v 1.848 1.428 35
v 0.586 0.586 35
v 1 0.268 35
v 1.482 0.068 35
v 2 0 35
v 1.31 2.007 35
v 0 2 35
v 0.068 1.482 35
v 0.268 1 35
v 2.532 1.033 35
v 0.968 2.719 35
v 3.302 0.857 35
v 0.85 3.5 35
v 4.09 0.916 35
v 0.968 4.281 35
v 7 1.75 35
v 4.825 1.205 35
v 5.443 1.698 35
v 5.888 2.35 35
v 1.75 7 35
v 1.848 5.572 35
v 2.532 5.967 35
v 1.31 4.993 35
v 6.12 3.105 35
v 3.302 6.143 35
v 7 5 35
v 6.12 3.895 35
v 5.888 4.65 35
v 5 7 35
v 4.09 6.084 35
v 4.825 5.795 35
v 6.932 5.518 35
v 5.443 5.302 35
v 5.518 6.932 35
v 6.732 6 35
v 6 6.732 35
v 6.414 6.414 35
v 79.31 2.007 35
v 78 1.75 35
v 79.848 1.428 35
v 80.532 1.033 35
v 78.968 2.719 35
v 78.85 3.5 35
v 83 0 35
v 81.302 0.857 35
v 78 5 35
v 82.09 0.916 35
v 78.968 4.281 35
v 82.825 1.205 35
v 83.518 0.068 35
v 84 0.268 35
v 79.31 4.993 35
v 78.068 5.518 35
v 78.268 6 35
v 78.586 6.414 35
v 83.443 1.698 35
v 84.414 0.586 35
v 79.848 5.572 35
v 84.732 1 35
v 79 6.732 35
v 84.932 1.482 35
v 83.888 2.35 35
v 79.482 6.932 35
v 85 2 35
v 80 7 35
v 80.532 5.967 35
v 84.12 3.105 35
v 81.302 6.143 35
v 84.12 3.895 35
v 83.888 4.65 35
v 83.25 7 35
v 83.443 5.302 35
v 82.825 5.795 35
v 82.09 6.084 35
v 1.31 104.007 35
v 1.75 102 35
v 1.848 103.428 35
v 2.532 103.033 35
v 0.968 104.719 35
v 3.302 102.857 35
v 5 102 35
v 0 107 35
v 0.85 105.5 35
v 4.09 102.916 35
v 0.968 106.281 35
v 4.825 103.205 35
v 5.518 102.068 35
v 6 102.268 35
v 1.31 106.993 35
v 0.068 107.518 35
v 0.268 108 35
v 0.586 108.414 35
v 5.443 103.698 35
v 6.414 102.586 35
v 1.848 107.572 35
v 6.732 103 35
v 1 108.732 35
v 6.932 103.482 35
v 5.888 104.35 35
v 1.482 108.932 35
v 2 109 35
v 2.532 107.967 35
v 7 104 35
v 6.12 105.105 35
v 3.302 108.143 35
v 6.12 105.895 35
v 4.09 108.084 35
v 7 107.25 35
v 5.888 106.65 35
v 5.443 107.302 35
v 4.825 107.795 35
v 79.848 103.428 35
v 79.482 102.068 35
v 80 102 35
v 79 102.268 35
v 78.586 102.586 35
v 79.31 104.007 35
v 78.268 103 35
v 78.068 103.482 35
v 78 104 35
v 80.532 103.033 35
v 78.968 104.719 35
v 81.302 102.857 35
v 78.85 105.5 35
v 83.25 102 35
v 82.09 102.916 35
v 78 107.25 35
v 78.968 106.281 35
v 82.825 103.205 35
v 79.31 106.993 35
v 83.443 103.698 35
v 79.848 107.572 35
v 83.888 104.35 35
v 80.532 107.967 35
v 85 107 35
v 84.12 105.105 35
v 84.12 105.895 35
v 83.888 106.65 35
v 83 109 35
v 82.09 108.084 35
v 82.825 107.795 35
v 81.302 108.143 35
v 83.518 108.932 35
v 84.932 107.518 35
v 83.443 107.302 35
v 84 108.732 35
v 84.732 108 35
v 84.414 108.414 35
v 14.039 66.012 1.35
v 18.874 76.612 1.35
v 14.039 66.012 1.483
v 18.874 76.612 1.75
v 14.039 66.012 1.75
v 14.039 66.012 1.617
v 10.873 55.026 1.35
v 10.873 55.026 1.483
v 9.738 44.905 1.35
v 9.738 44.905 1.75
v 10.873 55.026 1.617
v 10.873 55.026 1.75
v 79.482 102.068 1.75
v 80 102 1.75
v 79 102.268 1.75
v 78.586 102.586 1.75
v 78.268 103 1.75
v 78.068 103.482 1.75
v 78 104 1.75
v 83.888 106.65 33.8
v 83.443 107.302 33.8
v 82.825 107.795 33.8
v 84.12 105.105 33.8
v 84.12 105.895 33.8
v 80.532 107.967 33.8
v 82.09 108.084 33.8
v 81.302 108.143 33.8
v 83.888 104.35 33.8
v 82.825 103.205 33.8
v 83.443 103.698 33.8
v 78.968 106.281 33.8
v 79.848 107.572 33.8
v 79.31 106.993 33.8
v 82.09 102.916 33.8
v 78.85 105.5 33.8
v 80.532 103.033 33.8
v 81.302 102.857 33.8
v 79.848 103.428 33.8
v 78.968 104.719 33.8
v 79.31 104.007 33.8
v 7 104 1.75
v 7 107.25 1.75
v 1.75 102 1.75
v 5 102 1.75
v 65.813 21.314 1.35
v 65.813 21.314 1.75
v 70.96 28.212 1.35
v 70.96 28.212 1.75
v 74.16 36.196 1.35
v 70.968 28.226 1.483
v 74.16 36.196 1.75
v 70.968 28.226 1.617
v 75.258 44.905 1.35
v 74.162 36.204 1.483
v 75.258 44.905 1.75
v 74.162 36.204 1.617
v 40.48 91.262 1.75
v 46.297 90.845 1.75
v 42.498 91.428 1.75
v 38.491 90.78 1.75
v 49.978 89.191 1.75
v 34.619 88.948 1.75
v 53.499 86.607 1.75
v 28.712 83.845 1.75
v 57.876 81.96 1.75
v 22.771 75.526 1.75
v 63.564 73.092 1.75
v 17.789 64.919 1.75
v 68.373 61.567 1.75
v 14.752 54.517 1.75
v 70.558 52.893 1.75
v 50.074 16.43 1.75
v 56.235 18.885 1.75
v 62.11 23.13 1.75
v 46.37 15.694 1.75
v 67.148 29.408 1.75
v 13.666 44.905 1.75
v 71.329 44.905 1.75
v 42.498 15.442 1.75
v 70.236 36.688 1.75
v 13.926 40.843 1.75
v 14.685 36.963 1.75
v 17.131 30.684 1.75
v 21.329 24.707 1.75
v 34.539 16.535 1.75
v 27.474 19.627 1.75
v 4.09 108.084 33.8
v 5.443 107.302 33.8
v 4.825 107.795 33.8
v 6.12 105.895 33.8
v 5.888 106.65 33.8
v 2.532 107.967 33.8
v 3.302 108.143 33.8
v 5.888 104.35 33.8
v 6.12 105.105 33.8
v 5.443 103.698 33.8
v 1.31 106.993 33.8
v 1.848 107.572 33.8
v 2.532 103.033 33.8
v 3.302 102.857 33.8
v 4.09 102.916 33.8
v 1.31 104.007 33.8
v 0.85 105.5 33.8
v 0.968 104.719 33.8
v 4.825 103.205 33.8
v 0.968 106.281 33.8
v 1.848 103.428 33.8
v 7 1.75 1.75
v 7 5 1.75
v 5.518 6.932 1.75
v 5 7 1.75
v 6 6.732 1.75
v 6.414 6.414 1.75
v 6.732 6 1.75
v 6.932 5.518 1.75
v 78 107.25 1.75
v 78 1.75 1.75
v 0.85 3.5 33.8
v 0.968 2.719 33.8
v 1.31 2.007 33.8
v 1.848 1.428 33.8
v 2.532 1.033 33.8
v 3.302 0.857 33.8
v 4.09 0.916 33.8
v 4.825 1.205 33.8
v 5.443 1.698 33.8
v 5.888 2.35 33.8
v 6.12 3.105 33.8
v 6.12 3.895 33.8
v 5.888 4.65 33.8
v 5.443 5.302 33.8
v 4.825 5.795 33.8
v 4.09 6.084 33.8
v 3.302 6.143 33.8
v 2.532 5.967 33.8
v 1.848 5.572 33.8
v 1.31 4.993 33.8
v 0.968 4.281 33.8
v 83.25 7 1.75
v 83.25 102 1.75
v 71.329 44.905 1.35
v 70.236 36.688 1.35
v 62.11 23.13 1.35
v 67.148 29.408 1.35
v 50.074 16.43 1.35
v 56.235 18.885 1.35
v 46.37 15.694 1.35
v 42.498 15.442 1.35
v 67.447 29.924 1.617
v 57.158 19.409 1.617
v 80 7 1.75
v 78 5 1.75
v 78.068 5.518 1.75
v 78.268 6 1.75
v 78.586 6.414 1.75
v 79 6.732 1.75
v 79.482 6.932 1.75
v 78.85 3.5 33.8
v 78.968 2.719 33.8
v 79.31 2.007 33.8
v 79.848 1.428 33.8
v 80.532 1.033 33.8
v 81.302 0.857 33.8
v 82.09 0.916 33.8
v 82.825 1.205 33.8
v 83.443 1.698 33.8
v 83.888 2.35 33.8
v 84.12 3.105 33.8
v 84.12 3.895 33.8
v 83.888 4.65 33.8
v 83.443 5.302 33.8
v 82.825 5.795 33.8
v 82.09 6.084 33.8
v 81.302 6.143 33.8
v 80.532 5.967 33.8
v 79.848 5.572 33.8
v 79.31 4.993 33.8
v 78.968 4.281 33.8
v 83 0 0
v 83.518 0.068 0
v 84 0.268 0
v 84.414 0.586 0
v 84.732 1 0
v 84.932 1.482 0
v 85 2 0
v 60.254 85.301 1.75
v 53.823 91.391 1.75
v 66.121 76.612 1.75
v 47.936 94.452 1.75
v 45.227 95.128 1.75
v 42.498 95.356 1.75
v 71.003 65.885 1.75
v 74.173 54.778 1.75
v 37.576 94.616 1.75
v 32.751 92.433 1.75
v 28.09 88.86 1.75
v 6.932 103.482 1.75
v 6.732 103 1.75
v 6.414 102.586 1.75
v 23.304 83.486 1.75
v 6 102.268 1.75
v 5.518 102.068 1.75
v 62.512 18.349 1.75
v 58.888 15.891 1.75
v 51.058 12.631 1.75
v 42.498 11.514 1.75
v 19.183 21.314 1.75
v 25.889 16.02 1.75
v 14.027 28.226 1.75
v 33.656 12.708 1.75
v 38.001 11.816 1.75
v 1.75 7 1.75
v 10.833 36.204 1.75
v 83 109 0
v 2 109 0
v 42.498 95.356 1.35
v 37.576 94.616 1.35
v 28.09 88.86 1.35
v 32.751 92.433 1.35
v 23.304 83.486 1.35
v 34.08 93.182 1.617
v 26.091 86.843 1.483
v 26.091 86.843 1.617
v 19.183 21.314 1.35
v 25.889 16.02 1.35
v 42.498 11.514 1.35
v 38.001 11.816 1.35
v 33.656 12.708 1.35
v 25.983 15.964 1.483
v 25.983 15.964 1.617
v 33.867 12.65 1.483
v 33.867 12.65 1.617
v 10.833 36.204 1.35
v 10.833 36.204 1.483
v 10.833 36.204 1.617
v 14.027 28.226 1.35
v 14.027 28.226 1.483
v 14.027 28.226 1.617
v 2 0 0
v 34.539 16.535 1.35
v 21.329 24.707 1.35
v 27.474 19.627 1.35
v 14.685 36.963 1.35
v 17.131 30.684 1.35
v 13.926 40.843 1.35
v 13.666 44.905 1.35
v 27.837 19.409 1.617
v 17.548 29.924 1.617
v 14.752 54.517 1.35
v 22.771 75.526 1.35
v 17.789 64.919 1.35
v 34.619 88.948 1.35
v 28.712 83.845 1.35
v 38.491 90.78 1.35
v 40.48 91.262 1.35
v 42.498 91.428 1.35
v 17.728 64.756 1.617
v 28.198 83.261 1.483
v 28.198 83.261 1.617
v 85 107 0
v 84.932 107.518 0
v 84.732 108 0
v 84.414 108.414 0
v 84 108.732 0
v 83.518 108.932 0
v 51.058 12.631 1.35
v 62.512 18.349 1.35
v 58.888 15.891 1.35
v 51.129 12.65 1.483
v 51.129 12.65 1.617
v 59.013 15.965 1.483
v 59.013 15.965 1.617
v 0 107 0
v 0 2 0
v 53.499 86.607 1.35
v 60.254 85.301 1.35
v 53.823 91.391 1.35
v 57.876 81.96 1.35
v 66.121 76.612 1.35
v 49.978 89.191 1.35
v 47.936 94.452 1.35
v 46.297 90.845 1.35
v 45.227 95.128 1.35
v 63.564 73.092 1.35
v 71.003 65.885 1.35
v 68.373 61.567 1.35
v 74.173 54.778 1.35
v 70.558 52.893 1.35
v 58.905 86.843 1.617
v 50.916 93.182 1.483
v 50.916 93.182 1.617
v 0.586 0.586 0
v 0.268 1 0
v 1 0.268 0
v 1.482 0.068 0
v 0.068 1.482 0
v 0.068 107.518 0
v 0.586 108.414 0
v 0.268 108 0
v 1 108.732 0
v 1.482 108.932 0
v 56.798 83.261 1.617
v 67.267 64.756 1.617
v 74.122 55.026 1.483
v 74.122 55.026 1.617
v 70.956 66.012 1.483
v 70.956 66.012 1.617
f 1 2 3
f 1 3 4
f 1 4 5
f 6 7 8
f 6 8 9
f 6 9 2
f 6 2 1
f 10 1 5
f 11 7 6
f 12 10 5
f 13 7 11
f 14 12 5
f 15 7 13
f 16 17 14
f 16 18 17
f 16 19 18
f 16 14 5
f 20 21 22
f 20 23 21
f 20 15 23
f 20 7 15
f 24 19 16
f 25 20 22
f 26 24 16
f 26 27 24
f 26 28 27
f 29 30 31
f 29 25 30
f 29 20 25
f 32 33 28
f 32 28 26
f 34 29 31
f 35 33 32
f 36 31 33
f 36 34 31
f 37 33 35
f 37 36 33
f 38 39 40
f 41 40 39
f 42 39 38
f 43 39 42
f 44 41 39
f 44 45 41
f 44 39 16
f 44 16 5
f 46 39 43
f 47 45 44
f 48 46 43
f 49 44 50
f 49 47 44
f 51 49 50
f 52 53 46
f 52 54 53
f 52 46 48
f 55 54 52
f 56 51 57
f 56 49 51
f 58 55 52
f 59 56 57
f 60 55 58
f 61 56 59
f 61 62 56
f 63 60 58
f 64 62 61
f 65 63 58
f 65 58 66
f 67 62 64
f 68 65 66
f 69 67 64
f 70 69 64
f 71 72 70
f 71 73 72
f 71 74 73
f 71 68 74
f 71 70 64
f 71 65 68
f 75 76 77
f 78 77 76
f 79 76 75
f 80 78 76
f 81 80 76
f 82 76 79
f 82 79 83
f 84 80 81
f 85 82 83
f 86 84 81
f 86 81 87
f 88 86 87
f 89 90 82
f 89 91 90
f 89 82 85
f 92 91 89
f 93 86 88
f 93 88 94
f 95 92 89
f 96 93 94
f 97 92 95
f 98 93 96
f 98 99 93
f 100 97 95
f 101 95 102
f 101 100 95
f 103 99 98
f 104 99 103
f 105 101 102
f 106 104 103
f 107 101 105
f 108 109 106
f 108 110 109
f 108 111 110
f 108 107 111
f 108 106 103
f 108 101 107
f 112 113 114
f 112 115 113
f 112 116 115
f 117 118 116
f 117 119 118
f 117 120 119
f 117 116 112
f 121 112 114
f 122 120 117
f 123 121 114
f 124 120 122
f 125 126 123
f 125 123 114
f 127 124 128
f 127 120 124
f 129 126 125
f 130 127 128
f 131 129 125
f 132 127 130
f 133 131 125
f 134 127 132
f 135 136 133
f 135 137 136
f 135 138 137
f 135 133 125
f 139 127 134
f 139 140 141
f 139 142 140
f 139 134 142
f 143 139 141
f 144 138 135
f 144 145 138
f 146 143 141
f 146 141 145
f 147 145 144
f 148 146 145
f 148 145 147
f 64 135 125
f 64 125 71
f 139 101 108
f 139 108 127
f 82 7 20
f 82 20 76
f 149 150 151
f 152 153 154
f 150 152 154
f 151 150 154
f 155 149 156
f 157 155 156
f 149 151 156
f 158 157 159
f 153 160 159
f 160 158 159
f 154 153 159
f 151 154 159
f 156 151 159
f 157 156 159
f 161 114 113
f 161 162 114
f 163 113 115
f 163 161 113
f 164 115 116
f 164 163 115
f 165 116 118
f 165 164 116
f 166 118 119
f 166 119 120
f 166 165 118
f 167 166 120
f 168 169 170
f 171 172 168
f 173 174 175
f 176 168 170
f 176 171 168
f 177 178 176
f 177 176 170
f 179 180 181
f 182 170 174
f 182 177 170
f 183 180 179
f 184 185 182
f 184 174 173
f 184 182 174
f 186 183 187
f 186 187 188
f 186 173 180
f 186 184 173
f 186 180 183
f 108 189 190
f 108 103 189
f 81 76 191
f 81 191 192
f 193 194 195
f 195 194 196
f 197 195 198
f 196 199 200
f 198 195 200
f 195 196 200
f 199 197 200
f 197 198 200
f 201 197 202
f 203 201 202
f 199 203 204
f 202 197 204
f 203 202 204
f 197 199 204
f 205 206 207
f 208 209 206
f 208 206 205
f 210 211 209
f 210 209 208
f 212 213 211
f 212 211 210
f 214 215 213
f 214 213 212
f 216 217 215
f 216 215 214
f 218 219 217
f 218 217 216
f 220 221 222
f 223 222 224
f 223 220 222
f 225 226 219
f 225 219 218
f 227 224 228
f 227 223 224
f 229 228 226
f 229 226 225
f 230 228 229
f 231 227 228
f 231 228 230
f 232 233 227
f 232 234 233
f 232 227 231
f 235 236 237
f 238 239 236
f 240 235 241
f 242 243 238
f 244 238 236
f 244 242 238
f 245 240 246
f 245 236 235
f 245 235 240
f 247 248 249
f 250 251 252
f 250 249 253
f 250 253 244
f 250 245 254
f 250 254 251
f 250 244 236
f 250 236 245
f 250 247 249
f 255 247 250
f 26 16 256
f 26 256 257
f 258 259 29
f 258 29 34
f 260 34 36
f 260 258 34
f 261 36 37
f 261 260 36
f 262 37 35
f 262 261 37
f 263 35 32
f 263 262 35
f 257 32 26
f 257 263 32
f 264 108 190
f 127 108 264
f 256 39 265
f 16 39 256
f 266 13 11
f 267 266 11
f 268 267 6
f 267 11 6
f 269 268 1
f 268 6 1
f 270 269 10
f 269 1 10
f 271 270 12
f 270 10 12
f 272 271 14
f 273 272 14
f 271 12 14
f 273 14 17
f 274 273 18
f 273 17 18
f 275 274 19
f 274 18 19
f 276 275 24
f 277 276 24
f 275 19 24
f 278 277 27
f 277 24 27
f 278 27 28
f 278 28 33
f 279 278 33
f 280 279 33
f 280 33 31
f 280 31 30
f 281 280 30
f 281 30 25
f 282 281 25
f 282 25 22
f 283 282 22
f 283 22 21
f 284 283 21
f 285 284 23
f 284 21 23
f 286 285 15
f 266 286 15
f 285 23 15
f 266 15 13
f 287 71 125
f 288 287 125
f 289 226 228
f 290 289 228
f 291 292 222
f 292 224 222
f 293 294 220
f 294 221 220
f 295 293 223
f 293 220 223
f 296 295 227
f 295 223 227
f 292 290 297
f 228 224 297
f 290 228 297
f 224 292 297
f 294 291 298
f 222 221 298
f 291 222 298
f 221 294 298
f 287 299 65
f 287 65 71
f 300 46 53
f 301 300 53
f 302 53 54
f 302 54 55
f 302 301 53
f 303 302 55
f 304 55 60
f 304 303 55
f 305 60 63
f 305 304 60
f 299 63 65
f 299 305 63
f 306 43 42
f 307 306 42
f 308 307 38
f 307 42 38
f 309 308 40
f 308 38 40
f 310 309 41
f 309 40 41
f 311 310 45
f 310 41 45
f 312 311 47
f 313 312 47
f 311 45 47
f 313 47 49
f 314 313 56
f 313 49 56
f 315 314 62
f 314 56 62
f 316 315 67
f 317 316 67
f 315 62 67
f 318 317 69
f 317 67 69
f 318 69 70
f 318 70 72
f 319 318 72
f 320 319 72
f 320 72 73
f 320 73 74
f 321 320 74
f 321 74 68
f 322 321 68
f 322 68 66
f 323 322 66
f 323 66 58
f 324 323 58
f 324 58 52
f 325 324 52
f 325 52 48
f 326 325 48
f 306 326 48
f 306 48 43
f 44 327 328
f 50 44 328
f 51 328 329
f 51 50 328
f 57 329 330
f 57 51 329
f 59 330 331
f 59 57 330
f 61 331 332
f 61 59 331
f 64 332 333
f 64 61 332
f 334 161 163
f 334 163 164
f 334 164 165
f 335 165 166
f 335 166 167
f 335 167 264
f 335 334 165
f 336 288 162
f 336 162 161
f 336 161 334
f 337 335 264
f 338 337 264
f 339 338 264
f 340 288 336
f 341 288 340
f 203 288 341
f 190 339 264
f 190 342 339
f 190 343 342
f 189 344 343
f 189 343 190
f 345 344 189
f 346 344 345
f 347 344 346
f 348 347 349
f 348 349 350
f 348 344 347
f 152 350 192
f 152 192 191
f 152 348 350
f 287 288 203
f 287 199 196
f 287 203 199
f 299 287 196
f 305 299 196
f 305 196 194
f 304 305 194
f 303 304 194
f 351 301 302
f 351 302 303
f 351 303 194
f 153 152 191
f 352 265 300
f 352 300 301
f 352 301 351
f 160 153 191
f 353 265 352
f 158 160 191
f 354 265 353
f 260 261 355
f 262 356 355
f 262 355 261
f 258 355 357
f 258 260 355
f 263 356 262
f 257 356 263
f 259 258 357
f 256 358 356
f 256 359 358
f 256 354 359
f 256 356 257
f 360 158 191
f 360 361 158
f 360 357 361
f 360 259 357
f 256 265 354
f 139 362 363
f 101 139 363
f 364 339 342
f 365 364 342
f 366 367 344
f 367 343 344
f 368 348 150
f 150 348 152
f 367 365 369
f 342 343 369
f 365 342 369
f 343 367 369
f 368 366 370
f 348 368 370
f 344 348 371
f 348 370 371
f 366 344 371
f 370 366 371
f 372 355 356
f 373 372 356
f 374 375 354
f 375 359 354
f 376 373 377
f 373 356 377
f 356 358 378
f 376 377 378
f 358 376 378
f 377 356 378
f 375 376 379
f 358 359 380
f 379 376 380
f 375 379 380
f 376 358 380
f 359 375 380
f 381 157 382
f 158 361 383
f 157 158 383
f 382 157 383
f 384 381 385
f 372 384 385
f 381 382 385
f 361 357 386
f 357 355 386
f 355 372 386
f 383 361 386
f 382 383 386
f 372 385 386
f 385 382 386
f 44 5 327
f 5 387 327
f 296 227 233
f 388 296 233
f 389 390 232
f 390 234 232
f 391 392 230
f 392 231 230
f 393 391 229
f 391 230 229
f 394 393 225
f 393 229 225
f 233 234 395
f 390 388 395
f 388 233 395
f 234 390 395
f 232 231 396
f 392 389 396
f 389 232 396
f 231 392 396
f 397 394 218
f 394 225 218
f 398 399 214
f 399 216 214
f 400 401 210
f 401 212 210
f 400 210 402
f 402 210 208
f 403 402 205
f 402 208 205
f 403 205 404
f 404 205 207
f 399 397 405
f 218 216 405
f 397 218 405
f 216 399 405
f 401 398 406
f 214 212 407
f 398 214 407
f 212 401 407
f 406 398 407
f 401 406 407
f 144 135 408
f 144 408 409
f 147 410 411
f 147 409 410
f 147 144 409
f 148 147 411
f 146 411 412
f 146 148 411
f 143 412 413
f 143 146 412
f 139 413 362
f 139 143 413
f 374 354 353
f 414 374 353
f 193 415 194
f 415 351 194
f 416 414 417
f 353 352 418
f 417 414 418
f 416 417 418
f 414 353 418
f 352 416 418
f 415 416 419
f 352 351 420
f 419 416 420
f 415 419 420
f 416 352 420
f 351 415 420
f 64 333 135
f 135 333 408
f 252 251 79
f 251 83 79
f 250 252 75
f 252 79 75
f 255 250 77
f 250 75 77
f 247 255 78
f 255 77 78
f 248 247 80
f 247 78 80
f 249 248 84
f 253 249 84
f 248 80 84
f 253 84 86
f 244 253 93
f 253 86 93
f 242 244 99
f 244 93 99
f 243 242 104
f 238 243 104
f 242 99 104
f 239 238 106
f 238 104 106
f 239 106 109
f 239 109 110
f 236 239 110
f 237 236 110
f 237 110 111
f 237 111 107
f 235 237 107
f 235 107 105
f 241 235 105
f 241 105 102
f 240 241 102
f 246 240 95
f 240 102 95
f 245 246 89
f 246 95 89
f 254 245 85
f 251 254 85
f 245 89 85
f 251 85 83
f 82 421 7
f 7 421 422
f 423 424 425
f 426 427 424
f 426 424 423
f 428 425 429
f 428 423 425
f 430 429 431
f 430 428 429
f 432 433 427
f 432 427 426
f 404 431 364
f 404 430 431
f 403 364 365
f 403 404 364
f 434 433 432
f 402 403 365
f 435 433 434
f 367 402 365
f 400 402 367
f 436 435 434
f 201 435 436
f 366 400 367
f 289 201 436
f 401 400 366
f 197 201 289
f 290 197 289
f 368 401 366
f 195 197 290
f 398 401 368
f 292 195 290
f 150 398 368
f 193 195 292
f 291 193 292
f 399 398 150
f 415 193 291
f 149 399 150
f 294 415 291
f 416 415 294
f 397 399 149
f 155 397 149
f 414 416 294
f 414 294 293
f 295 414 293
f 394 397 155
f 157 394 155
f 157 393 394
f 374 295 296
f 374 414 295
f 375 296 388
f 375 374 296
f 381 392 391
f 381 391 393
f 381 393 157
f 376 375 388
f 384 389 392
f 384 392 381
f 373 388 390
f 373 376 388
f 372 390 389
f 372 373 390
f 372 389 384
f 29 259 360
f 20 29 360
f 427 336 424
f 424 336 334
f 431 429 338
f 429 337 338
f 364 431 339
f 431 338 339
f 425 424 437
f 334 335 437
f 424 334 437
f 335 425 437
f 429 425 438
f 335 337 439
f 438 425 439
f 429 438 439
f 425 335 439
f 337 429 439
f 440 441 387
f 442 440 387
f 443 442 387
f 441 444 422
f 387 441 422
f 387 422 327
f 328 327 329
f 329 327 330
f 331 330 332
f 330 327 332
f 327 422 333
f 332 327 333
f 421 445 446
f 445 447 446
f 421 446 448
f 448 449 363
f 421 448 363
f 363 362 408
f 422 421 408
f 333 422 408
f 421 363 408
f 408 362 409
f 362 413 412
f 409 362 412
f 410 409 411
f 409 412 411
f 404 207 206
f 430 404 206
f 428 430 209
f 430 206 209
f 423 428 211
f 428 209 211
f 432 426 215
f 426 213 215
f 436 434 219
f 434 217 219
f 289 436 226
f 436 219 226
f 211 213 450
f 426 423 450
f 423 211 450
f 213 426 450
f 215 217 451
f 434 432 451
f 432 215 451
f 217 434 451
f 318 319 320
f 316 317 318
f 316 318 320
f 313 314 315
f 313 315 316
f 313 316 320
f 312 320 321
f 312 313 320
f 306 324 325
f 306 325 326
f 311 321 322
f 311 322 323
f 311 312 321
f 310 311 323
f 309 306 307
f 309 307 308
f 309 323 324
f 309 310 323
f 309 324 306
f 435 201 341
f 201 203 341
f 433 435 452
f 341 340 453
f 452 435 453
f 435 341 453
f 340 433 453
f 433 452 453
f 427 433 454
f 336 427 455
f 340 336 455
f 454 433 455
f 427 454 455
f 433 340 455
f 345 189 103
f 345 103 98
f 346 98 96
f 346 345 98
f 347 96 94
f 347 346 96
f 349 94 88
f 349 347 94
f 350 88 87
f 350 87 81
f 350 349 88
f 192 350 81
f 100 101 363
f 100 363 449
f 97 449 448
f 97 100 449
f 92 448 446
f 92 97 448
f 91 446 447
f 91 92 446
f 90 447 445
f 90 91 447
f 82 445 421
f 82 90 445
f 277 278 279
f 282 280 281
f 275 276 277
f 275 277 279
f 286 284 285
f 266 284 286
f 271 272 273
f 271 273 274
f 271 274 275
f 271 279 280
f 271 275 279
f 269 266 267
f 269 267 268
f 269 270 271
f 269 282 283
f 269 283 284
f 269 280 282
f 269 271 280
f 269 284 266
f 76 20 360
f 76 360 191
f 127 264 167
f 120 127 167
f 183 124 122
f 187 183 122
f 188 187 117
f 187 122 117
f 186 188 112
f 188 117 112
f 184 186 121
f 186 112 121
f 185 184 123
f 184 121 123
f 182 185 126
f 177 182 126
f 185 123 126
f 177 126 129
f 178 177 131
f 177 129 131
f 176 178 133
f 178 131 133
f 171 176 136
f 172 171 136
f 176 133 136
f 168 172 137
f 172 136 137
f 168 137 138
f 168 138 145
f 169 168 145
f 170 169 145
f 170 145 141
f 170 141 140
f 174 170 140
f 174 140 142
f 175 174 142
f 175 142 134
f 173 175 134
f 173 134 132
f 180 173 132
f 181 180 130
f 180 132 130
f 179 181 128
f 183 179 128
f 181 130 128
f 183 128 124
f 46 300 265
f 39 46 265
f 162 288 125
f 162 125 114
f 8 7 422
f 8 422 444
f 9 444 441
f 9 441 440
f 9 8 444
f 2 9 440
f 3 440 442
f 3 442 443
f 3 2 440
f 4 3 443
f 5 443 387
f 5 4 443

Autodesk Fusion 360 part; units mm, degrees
sketch "Skizze1" plane through (0, 0, 0) normal (0, 0, 1) x (1, 0, 0)
  line L0 (0, 0) -> (85, 0)
  line L1 (85, 0) -> (85, 109)
  line L2 (85, 109) -> (0, 109)
  line L3 (0, 109) -> (0, 0)
  dimension "d1" = 85
  dimension "d2" = 109
extrude "Extrusion16" add sketch "Skizze1" along normal blind 35
sketch "Skizze17" plane through (0, 0, 35) normal (0, 0, 1) x (-1, 0, 0)
  line L0 (0, -109) -> (0, 0)
  line L1 (0, 0) -> (-85, 0)
  line L2 (-85, 0) -> (-85, -109)
  line L3 (-85, -109) -> (0, -109)
  line L4 (0, -109) -> (-7, -109)
  line L5 (-7, -109) -> (-7, -102)
  line L6 (-7, -102) -> (0, -102)
  line L7 (0, -102) -> (0, -109)
  line L8 (-85, -109) -> (-78, -109)
  line L9 (-78, -109) -> (-78, -102)
  line L10 (-78, -102) -> (-85, -102)
  line L11 (-85, -102) -> (-85, -109)
  line L12 (0, 0) -> (-7, 0)
  line L13 (-7, 0) -> (-7, -7)
  line L14 (-7, -7) -> (0, -7)
  line L15 (0, -7) -> (0, 0)
  line L16 (-85, 0) -> (-78, 0)
  line L17 (-78, 0) -> (-78, -7)
  line L18 (-78, -7) -> (-85, -7)
  line L19 (-85, -7) -> (-85, 0)
  circle A0 centre (-3.5, -105.5) radius 2.65
  circle A1 centre (-81.5, -105.5) radius 2.65
  circle A2 centre (-81.5, -3.5) radius 2.65
  circle A3 centre (-3.5, -3.5) radius 2.65
  dimension "d148" = 7
  dimension "d149" = 7
  dimension "d150" = 7
  dimension "d151" = 7
  dimension "d152" = 7
  dimension "d153" = 7
  dimension "d154" = 7
  dimension "d155" = 7
  dimension "d156" = 5.3
  dimension "d157" = 5.3
  dimension "d158" = 5.3
  dimension "d159" = 5.3
  dimension "d160" = 3.5
  dimension "d161" = 3.5
  dimension "d162" = 3.5
  dimension "d163" = 3.5
  dimension "d164" = 3.5
  dimension "d165" = 3.5
  dimension "d166" = 3.5
  dimension "d167" = 3.5
sketch "Skizze18" plane through (0, 0, 35) normal (0, 0, 1) x (-1, 0, 0)
  line L0 (-78, -1.75) -> (-7, -1.75)
  line L1 (-7, -1.75) -> (-7, -107.25)
  line L2 (-7, -107.25) -> (-78, -107.25)
  line L3 (-78, -107.25) -> (-78, -1.75)
  line L4 (0, -109) -> (0, 0)
  line L5 (-78, 0) -> (-78, -7)
  line L6 (-85, 0) -> (-85, -109)
  line L7 (0, 0) -> (-85, 0)
  line L8 (-85, -109) -> (0, -109)
  dimension "d168" = 7
  dimension "d170" = 7
  dimension "d171" = 1.75
  dimension "d172" = 1.75
sketch "Skizze19" plane through (0, 0, 35) normal (0, 0, 1) x (-1, 0, 0)
  line L0 (-7, -7) -> (-1.75, -7)
  line L1 (-1.75, -7) -> (-1.75, -102)
  line L2 (-1.75, -102) -> (-7, -102)
  line L3 (-7, -102) -> (-7, -7)
  line L4 (0, 0) -> (-7, 0)
  line L5 (0, -109) -> (-7, -109)
  line L6 (0, -109) -> (0, 0)
  line L7 (-78, -7) -> (-83.25, -7)
  line L8 (-83.25, -7) -> (-83.25, -102)
  line L9 (-83.25, -102) -> (-78, -102)
  line L10 (-78, -102) -> (-78, -7)
  line L11 (-85, 0) -> (-85, -109)
  line L12 (-85, -109) -> (-78, -109)
  line L13 (-85, 0) -> (-78, 0)
  dimension "d174" = 7
  dimension "d175" = 7
  dimension "d176" = 7
  dimension "d177" = 1.75
  dimension "d178" = 1.75
  dimension "d179" = 7
  dimension "d180" = 7
  dimension "d181" = 7
extrude "Extrusion17" cut sketch "Skizze17" against normal blind 1.2 contours A0 | A1 | A2 | A3
extrude "Extrusion18" cut sketch "Skizze18" sketch "Skizze19" against normal blind 33.25 contours L0 L1 L2 L3 L5 of sketch 2
fillet "Abrundung5" radius 2 8 edges at (7, 102, 18.375) (78, 102, 18.375) (78, 7, 18.375) (7, 7, 18.375) (85, 109, 17.5) (0, 109, 17.5) (0, 0, 17.5) (85, 0, 17.5)
sketch "Skizze20" plane through (0, 0, 1.75) normal (0, 0, 1) x (-1, 0, 0)
  line L0 (-78, -104) -> (-78, -107.25)
  line L1 (-78, -107.25) -> (-7, -107.25)
  line L2 (-7, -107.25) -> (-7, -104)
  arc A0 (-5, -102) -> (-7, -104) centre (-5, -104) ccw
  line L3 (-5, -102) -> (-1.75, -102)
  line L4 (-1.75, -102) -> (-1.75, -7)
  line L5 (-1.75, -7) -> (-5, -7)
  arc A1 (-7, -5) -> (-5, -7) centre (-5, -5) ccw
  line L6 (-7, -5) -> (-7, -1.75)
  line L7 (-7, -1.75) -> (-78, -1.75)
  line L8 (-78, -1.75) -> (-78, -5)
  arc A2 (-80, -7) -> (-78, -5) centre (-80, -5) ccw
  line L9 (-80, -7) -> (-83.25, -7)
  line L10 (-83.25, -7) -> (-83.25, -102)
  line L11 (-83.25, -102) -> (-80, -102)
  arc A3 (-78, -104) -> (-80, -102) centre (-80, -104) ccw
  spline S0 degree 3 poles (-66.1211, -76.6115) (-59.4052, -88.6986) (-51.0157, -95.3555) (-42.4975, -95.3555) knots 0 0 0 0 1 1 1 1
  spline S1 degree 3 poles (-42.4975, -95.3555) (-33.9794, -95.3555) (-25.5902, -88.6986) (-18.874, -76.6115) knots 0 0 0 0 1 1 1 1
  spline S2 degree 3 poles (-18.874, -76.6115) (-13.324, -66.622) (-9.7378, -54.1768) (-9.7378, -44.9054) knots 0 0 0 0 1 1 1 1
  spline S3 degree 3 poles (-9.7378, -44.9054) (-9.7378, -35.9571) (-13.092, -27.5787) (-19.183, -21.3143) knots 0 0 0 0 1 1 1 1
  spline S4 degree 3 poles (-19.183, -21.3143) (-25.3273, -14.9941) (-33.6072, -11.5139) (-42.4979, -11.5139) knots 0 0 0 0 1 1 1 1
  spline S5 degree 3 poles (-42.4979, -11.5139) (-51.3886, -11.5139) (-59.6684, -14.9944) (-65.8128, -21.3143) knots 0 0 0 0 1 1 1 1
  spline S6 degree 3 poles (-65.8128, -21.3143) (-71.9035, -27.5791) (-75.2576, -35.9571) (-75.2576, -44.9054) knots 0 0 0 0 1 1 1 1
  spline S7 degree 3 poles (-75.2576, -44.9054) (-75.2573, -54.1768) (-71.671, -66.6223) (-66.1211, -76.6115) knots 0 0 0 0 1 1 1 1
  spline S8 degree 3 poles (-42.4975, -15.4416) (-26.3299, -15.4416) (-13.6658, -28.3836) (-13.6658, -44.9054) knots 0 0 0 0 1 1 1 1
  spline S9 degree 3 poles (-13.6658, -44.9054) (-13.6658, -62.4321) (-27.1411, -91.4275) (-42.4975, -91.4275) knots 0 0 0 0 1 1 1 1
  spline S10 degree 3 poles (-42.4975, -91.4275) (-57.854, -91.4275) (-71.3293, -62.4321) (-71.3293, -44.9054) knots 0 0 0 0 1 1 1 1
  spline S11 degree 3 poles (-71.3293, -44.9054) (-71.3293, -28.3836) (-58.6652, -15.4416) (-42.4975, -15.4416) knots 0 0 0 0 1 1 1 1
extrude "Extrusion19" cut sketch "Skizze20" against normal blind 0.4 contours S0 S1 S2 S3 S4 S5 S6 S7
extrude "Extrusion9" [suppressed]
sketch "Skizze14" plane through (0, 0, 35) normal (0, 0, 1) x (-1, 0, 0)
  line L0 (0, -115) -> (0, 0)
  line L1 (0, 0) -> (-85, 0)
  line L2 (-85, 0) -> (-85, -115)
  line L3 (-85, -115) -> (0, -115)
  line L4 (0, -115) -> (-7, -115)
  line L5 (-7, -115) -> (-7, -108)
  line L6 (-7, -108) -> (0, -108)
  line L7 (0, -108) -> (0, -115)
  line L8 (-85, -115) -> (-78, -115)
  line L9 (-78, -115) -> (-78, -108)
  line L10 (-78, -108) -> (-85, -108)
  line L11 (-85, -108) -> (-85, -115)
  line L12 (0, 0) -> (-7, 0)
  line L13 (-7, 0) -> (-7, -7)
  line L14 (-7, -7) -> (0, -7)
  line L15 (0, -7) -> (0, 0)
  line L16 (-85, 0) -> (-78, 0)
  line L17 (-78, 0) -> (-78, -7)
  line L18 (-78, -7) -> (-85, -7)
  line L19 (-85, -7) -> (-85, 0)
  circle A0 centre (-3.5, -111.5) radius 2.65
  circle A1 centre (-81.5, -111.5) radius 2.65
  circle A2 centre (-81.5, -3.5) radius 2.65
  circle A3 centre (-3.5, -3.5) radius 2.65
  dimension "d104" = 7
  dimension "d105" = 7
  dimension "d106" = 7
  dimension "d107" = 7
  dimension "d108" = 7
  dimension "d109" = 7
  dimension "d110" = 7
  dimension "d111" = 7
  dimension "d112" = 5.3
  dimension "d113" = 5.3
  dimension "d114" = 5.3
  dimension "d115" = 5.3
  dimension "d116" = 3.5
  dimension "d117" = 3.5
  dimension "d118" = 3.5
  dimension "d119" = 3.5
  dimension "d120" = 3.5
  dimension "d121" = 3.5
  dimension "d122" = 3.5
  dimension "d123" = 3.5
sketch "Skizze15" plane through (0, 0, 35) normal (0, 0, 1) x (-1, 0, 0)
  line L0 (-78, -113.25) -> (-7, -113.25)
  line L1 (-7, -113.25) -> (-7, -1.75)
  line L2 (-7, -1.75) -> (-78, -1.75)
  line L3 (-78, -1.75) -> (-78, -113.25)
  line L4 (0, 0) -> (-85, 0)
  line L5 (0, -115) -> (0, 0)
  line L6 (-85, -115) -> (0, -115)
  line L7 (-85, 0) -> (-85, -115)
  line L8 (-78, -108) -> (-83.25, -108)
  line L9 (-83.25, -108) -> (-83.25, -7)
  line L10 (-83.25, -7) -> (-78, -7)
  line L11 (-78, -7) -> (-78, -108)
  line L12 (-85, 0) -> (-78, 0)
  line L13 (-85, -115) -> (-78, -115)
  line L14 (-7, -108) -> (-1.75, -108)
  line L15 (-1.75, -108) -> (-1.75, -7)
  line L16 (-1.75, -7) -> (-7, -7)
  line L17 (-7, -7) -> (-7, -108)
  line L18 (-7, -7) -> (0, -7)
  line L19 (0, 0) -> (-7, 0)
  line L20 (0, -115) -> (-7, -115)
  dimension "d124" = 1.75
  dimension "d125" = 7
  dimension "d126" = 1.75
  dimension "d127" = 7
  dimension "d128" = 1.75
  dimension "d129" = 7
  dimension "d130" = 7
  dimension "d133" = 1.75
  dimension "d134" = 7
  dimension "d135" = 7
extrude "Extrusion13" [suppressed]
extrude "Extrusion14" [suppressed]
sketch "Skizze16" plane through (0, 0, 1.75) normal (0, 0, 1) x (-1, 0, 0)
  line L0 (-7, -1.75) -> (-78, -1.75)
  line L1 (-78, -1.75) -> (-78, -7)
  line L2 (-78, -7) -> (-83.25, -7)
  line L3 (-83.25, -7) -> (-83.25, -108)
  line L4 (-83.25, -108) -> (-78, -108)
  line L5 (-78, -108) -> (-78, -113.25)
  line L6 (-78, -113.25) -> (-7, -113.25)
  line L7 (-7, -113.25) -> (-7, -108)
  line L8 (-7, -108) -> (-1.75, -108)
  line L9 (-1.75, -108) -> (-1.75, -7)
  line L10 (-1.75, -7) -> (-7, -7)
  line L11 (-7, -7) -> (-7, -1.75)
  spline S0 degree 3 poles (-64.8008, -78.3152) (-58.6523, -89.381) (-50.9717, -95.4755) (-43.1733, -95.4755) knots 0 0 0 0 1 1 1 1
  spline S1 degree 3 poles (-43.1733, -95.4755) (-35.3749, -95.4755) (-27.6945, -89.381) (-21.5458, -78.3152) knots 0 0 0 0 1 1 1 1
  spline S2 degree 3 poles (-21.5458, -78.3152) (-16.4648, -69.1698) (-13.1816, -57.7762) (-13.1816, -49.2882) knots 0 0 0 0 1 1 1 1
  spline S3 degree 3 poles (-13.1816, -49.2882) (-13.1816, -41.096) (-16.2524, -33.4256) (-21.8287, -27.6904) knots 0 0 0 0 1 1 1 1
  spline S4 degree 3 poles (-21.8287, -27.6904) (-27.4539, -21.9043) (-35.0341, -18.7182) (-43.1736, -18.7182) knots 0 0 0 0 1 1 1 1
  spline S5 degree 3 poles (-43.1736, -18.7182) (-51.313, -18.7182) (-58.8933, -21.9046) (-64.5185, -27.6904) knots 0 0 0 0 1 1 1 1
  spline S6 degree 3 poles (-64.5185, -27.6904) (-70.0945, -33.4259) (-73.1653, -41.096) (-73.1653, -49.2882) knots 0 0 0 0 1 1 1 1
  spline S7 degree 3 poles (-73.1653, -49.2882) (-73.165, -57.7762) (-69.8817, -69.1701) (-64.8008, -78.3152) knots 0 0 0 0 1 1 1 1
  spline S8 degree 3 poles (-43.1733, -22.3139) (-28.3718, -22.3139) (-16.7777, -34.1625) (-16.7777, -49.2882) knots 0 0 0 0 1 1 1 1
  spline S9 degree 3 poles (-16.7777, -49.2882) (-16.7777, -65.334) (-29.1144, -91.8794) (-43.1733, -91.8794) knots 0 0 0 0 1 1 1 1
  spline S10 degree 3 poles (-43.1733, -91.8794) (-57.2322, -91.8794) (-69.5689, -65.334) (-69.5689, -49.2882) knots 0 0 0 0 1 1 1 1
  spline S11 degree 3 poles (-69.5689, -49.2882) (-69.5689, -34.1625) (-57.9748, -22.3139) (-43.1733, -22.3139) knots 0 0 0 0 1 1 1 1
extrude "Extrusion15" [suppressed]
fillet "Abrundung3" [suppressed]
fillet "Abrundung4" [suppressed]
sketch "Skizze11" plane through (0, 0, 35) normal (0, 0, 1) x (-1, 0, 0)
  line L0 (0, -115) -> (0, 0)
  line L1 (0, 0) -> (-85, 0)
  line L2 (-85, 0) -> (-85, -115)
  line L3 (-85, -115) -> (0, -115)
  line L4 (0, -115) -> (-7, -115)
  line L5 (-7, -115) -> (-7, -108)
  line L6 (-7, -108) -> (0, -108)
  line L7 (0, -108) -> (0, -115)
  line L8 (-85, -115) -> (-78, -115)
  line L9 (-78, -115) -> (-78, -108)
  line L10 (-78, -108) -> (-85, -108)
  line L11 (-85, -108) -> (-85, -115)
  line L12 (0, 0) -> (-7, 0)
  line L13 (-7, 0) -> (-7, -7)
  line L14 (-7, -7) -> (0, -7)
  line L15 (0, -7) -> (0, 0)
  line L16 (-85, 0) -> (-78, 0)
  line L17 (-78, 0) -> (-78, -7)
  line L18 (-78, -7) -> (-85, -7)
  line L19 (-85, -7) -> (-85, 0)
  circle A0 centre (-3.5, -3.5) radius 2.65
  circle A1 centre (-81.5, -3.5) radius 2.65
  circle A2 centre (-3.5, -111.5) radius 2.65
  circle A3 centre (-81.5, -111.5) radius 2.65
  dimension "d65" = 7
  dimension "d66" = 7
  dimension "d67" = 7
  dimension "d68" = 7
  dimension "d69" = 7
  dimension "d70" = 7
  dimension "d71" = 7
  dimension "d72" = 7
  dimension "d73" = 5.3
  dimension "d74" = 5.3
  dimension "d75" = 5.3
  dimension "d76" = 5.3
  dimension "d77" = 3.5
  dimension "d78" = 3.5
  dimension "d79" = 3.5
  dimension "d80" = 3.5
  dimension "d81" = 3.5
  dimension "d82" = 3.5
  dimension "d83" = 3.5
  dimension "d84" = 3.5
sketch "Skizze12" plane through (0, 0, 35) normal (0, 0, 1) x (-1, 0, 0)
  line L0 (-78, -1.75) -> (-7, -1.75)
  line L1 (-7, -1.75) -> (-7, -113.25)
  line L2 (-7, -113.25) -> (-78, -113.25)
  line L3 (-78, -113.25) -> (-78, -1.75)
  line L4 (-85, -115) -> (0, -115)
  line L5 (0, 0) -> (-85, 0)
  line L6 (0, -115) -> (0, 0)
  line L7 (-85, 0) -> (-85, -115)
  line L8 (-78, -7) -> (-83.25, -7)
  line L9 (-83.25, -7) -> (-83.25, -108)
  line L10 (-83.25, -108) -> (-78, -108)
  line L11 (-78, -108) -> (-78, -7)
  line L12 (-85, -115) -> (-78, -115)
  line L13 (-85, 0) -> (-78, 0)
  line L14 (-7, -7.2335) -> (-1.75, -7.2335)
  line L15 (-1.75, -7.2335) -> (-1.75, -108)
  line L16 (-1.75, -108) -> (-7, -108)
  line L17 (-7, -108) -> (-7, -7.2335)
  line L18 (-7, -108) -> (0, -108)
  line L19 (0, -115) -> (-7, -115)
  dimension "d85" = 1.75
  dimension "d86" = 1.75
  dimension "d87" = 7
  dimension "d88" = 7
  dimension "d89" = 7
  dimension "d90" = 7
  dimension "d91" = 1.75
  dimension "d92" = 1.75
  dimension "d93" = 7
extrude "Extrusion10" [suppressed]
extrude "Extrusion11" [suppressed]
sketch "Skizze13" plane through (0, 0, 6.75) normal (0, 0, 1) x (-1, 0, 0)
  line L0 (-7, -113.25) -> (-7, -108)
  line L1 (-7, -108) -> (-1.75, -108)
  line L2 (-1.75, -108) -> (-1.75, -7.2335)
  line L3 (-1.75, -7.2335) -> (-7, -7.2335)
  line L4 (-7, -7.2335) -> (-7, -1.75)
  line L5 (-7, -1.75) -> (-78, -1.75)
  line L6 (-78, -1.75) -> (-78, -7)
  line L7 (-78, -7) -> (-83.25, -7)
  line L8 (-83.25, -7) -> (-83.25, -108)
  line L9 (-83.25, -108) -> (-78, -108)
  line L10 (-78, -108) -> (-78, -113.25)
  line L11 (-78, -113.25) -> (-7, -113.25)
  spline S0 degree 3 poles (-61.8748, -78.6389) (-56.1896, -88.8708) (-49.0877, -94.5061) (-41.8769, -94.5061) knots 0 0 0 0 1 1 1 1
  spline S1 degree 3 poles (-41.8769, -94.5061) (-34.6661, -94.5061) (-27.5645, -88.8708) (-21.8791, -78.6389) knots 0 0 0 0 1 1 1 1
  spline S2 degree 3 poles (-21.8791, -78.6389) (-17.1809, -70.1825) (-14.1451, -59.6474) (-14.1451, -51.799) knots 0 0 0 0 1 1 1 1
  spline S3 degree 3 poles (-14.1451, -51.799) (-14.1451, -44.2241) (-16.9845, -37.1316) (-22.1406, -31.8286) knots 0 0 0 0 1 1 1 1
  spline S4 degree 3 poles (-22.1406, -31.8286) (-27.342, -26.4785) (-34.3511, -23.5325) (-41.8772, -23.5325) knots 0 0 0 0 1 1 1 1
  spline S5 degree 3 poles (-41.8772, -23.5325) (-49.4033, -23.5325) (-56.4124, -26.4788) (-61.6137, -31.8286) knots 0 0 0 0 1 1 1 1
  spline S6 degree 3 poles (-61.6137, -31.8286) (-66.7696, -37.1319) (-69.609, -44.2241) (-69.609, -51.799) knots 0 0 0 0 1 1 1 1
  spline S7 degree 3 poles (-69.609, -51.799) (-69.6087, -59.6474) (-66.5729, -70.1828) (-61.8748, -78.6389) knots 0 0 0 0 1 1 1 1
  spline S8 degree 3 poles (-41.8769, -26.8573) (-28.1907, -26.8573) (-17.4702, -37.813) (-17.4702, -51.799) knots 0 0 0 0 1 1 1 1
  spline S9 degree 3 poles (-17.4702, -51.799) (-17.4702, -66.6357) (-28.8773, -91.181) (-41.8769, -91.181) knots 0 0 0 0 1 1 1 1
  spline S10 degree 3 poles (-41.8769, -91.181) (-54.8765, -91.181) (-66.2836, -66.6357) (-66.2836, -51.799) knots 0 0 0 0 1 1 1 1
  spline S11 degree 3 poles (-66.2836, -51.799) (-66.2836, -37.813) (-55.5631, -26.8573) (-41.8769, -26.8573) knots 0 0 0 0 1 1 1 1
extrude "Extrusion12" [suppressed]
fillet "Abrundung1" [suppressed]
fillet "Abrundung2" [suppressed]
extrude "Extrusion1" [suppressed]
sketch "Skizze2" plane through (0, 0, 30) normal (0, 0, 1) x (-1, 0, 0)
  line L0 (0, -115) -> (0, 0)
  line L1 (0, 0) -> (-85, 0)
  line L2 (-85, 0) -> (-85, -115)
  line L3 (-85, -115) -> (0, -115)
  line L4 (0, -115) -> (-7, -115)
  line L5 (-7, -115) -> (-7, -108)
  line L6 (-7, -108) -> (0, -108)
  line L7 (0, -108) -> (0, -115)
  line L8 (-85, -115) -> (-78, -115)
  line L9 (-78, -115) -> (-78, -108)
  line L10 (-78, -108) -> (-85, -108)
  line L11 (-85, -108) -> (-85, -115)
  line L12 (-85, 0) -> (-78, 0)
  line L13 (-78, 0) -> (-78, -7)
  line L14 (-78, -7) -> (-85, -7)
  line L15 (-85, -7) -> (-85, 0)
  line L16 (0, 0) -> (-7, 0)
  line L17 (-7, 0) -> (-7, -7)
  line L18 (-7, -7) -> (0, -7)
  line L19 (0, -7) -> (0, 0)
  circle A0 centre (-3.5, -3.5) radius 2.65
  circle A1 centre (-81.5, -3.5) radius 2.65
  circle A2 centre (-81.5, -111.5) radius 2.65
  circle A3 centre (-3.5, -111.5) radius 2.65
  dimension "d5" = 7
  dimension "d6" = 7
  dimension "d7" = 7
  dimension "d8" = 7
  dimension "d9" = 7
  dimension "d10" = 7
  dimension "d11" = 7
  dimension "d12" = 7
  dimension "d13" = 5.3
  dimension "d14" = 5.3
  dimension "d15" = 5.3
  dimension "d16" = 5.3
  dimension "d17" = 3.5
  dimension "d18" = 3.5
  dimension "d19" = 3.5
  dimension "d20" = 3.5
  dimension "d21" = 3.5
  dimension "d22" = 3.5
  dimension "d23" = 3.5
  dimension "d24" = 3.5
sketch "Skizze3" plane through (0, 0, 30) normal (0, 0, 1) x (-1, 0, 0)
  line L0 (-78, -1.75) -> (-7, -1.75)
  line L1 (-7, -1.75) -> (-7, -113.25)
  line L2 (-7, -113.25) -> (-78, -113.25)
  line L3 (-78, -113.25) -> (-78, -1.75)
  line L4 (0, 0) -> (-85, 0)
  line L5 (-85, -115) -> (0, -115)
  line L6 (-78, -115) -> (-78, -108)
  line L7 (-85, 0) -> (-85, -115)
  line L8 (0, -115) -> (0, 0)
  dimension "d25" = 1.75
  dimension "d26" = 1.75
  dimension "d28" = 7
  dimension "d29" = 7
extrude "Extrusion2" [suppressed]
sketch "Skizze5" plane through (0, 0, 30) normal (0, 0, 1) x (-1, 0, 0)
  line L0 (-78, -1.75) -> (-7, -1.75)
  line L1 (-7, -1.75) -> (-7, -113.25)
  line L2 (-7, -113.25) -> (-78, -113.25)
  line L3 (-78, -113.25) -> (-78, -1.75)
  line L4 (0, -115) -> (0, 0)
  line L5 (0, 0) -> (-85, 0)
  line L6 (-85, 0) -> (-85, -115)
  line L7 (-85, -115) -> (0, -115)
  line L8 (-7, -108) -> (-1.75, -108)
  line L9 (-1.75, -108) -> (-1.75, -22)
  line L10 (-1.75, -22) -> (-7, -22)
  line L11 (-7, -22) -> (-7, -108)
  line L12 (0, -115) -> (0, 0)
  line L13 (0, -115) -> (-7, -115)
  dimension "d33" = 1.75
  dimension "d34" = 86
  dimension "d35" = 7
sketch "Skizze6" plane through (0, 0, 30) normal (0, 0, 1) x (-1, 0, 0)
  line L0 (-7, -7) -> (-1.75, -7)
  line L1 (-1.75, -7) -> (-1.75, -93)
  line L2 (-1.75, -93) -> (-7, -93)
  line L3 (-7, -93) -> (-7, -7)
  line L4 (0, -115) -> (0, 0)
  line L5 (0, 0) -> (-7, 0)
  line L6 (-78, -22) -> (-83.25, -22)
  line L7 (-83.25, -22) -> (-83.25, -108)
  line L8 (-83.25, -108) -> (-78, -108)
  line L9 (-78, -108) -> (-78, -22)
  line L10 (-85, 0) -> (-85, -115)
  line L11 (-85, -115) -> (-78, -115)
  line L12 (-78, -7) -> (-85, -7)
  line L13 (-85, 0) -> (-78, 0)
  dimension "d36" = 86
  dimension "d37" = 1.75
  dimension "d38" = 7
  dimension "d39" = 7
  dimension "d44" = 1.75
  dimension "d45" = 7
  dimension "d47" = 86
  dimension "d48" = 7
extrude "Extrusion3" [suppressed]
extrude "Extrusion4" [suppressed]
extrude "Extrusion5" [suppressed]
sketch "Skizze7" plane through (0, 0, 1.75) normal (0, 0, 1) x (-1, 0, 0)
  line L0 (-7, -7) -> (-7, -1.75)
  line L1 (-7, -1.75) -> (-78, -1.75)
  line L2 (-78, -1.75) -> (-78, -22)
  line L3 (-78, -22) -> (-83.25, -22)
  line L4 (-83.25, -22) -> (-83.25, -108)
  line L5 (-83.25, -108) -> (-78, -108)
  line L6 (-78, -108) -> (-78, -113.25)
  line L7 (-78, -113.25) -> (-7, -113.25)
  line L8 (-7, -113.25) -> (-7, -93)
  line L9 (-7, -93) -> (-1.75, -93)
  line L10 (-1.75, -93) -> (-1.75, -7)
  line L11 (-1.75, -7) -> (-7, -7)
  spline S0 degree 3 poles (-57.2282, -66.5179) (-52.2019, -75.5641) (-45.9231, -80.5463) (-39.5479, -80.5463) knots 0 0 0 0 1 1 1 1
  spline S1 degree 3 poles (-39.5479, -80.5463) (-33.1727, -80.5463) (-26.8941, -75.5641) (-21.8675, -66.5179) knots 0 0 0 0 1 1 1 1
  spline S2 degree 3 poles (-21.8675, -66.5179) (-17.7139, -59.0415) (-15.0298, -49.7273) (-15.0298, -42.7885) knots 0 0 0 0 1 1 1 1
  spline S3 degree 3 poles (-15.0298, -42.7885) (-15.0298, -36.0914) (-17.5402, -29.8208) (-22.0988, -25.1324) knots 0 0 0 0 1 1 1 1
  spline S4 degree 3 poles (-22.0988, -25.1324) (-26.6973, -20.4022) (-32.8942, -17.7976) (-39.5481, -17.7976) knots 0 0 0 0 1 1 1 1
  spline S5 degree 3 poles (-39.5481, -17.7976) (-46.2021, -17.7976) (-52.3989, -20.4025) (-56.9975, -25.1324) knots 0 0 0 0 1 1 1 1
  spline S6 degree 3 poles (-56.9975, -25.1324) (-61.5558, -29.8211) (-64.0662, -36.0914) (-64.0662, -42.7885) knots 0 0 0 0 1 1 1 1
  spline S7 degree 3 poles (-64.0662, -42.7885) (-64.0659, -49.7273) (-61.3819, -59.0418) (-57.2282, -66.5179) knots 0 0 0 0 1 1 1 1
  spline S8 degree 3 poles (-39.5479, -20.7371) (-27.4477, -20.7371) (-17.9696, -30.4232) (-17.9696, -42.7885) knots 0 0 0 0 1 1 1 1
  spline S9 degree 3 poles (-17.9696, -42.7885) (-17.9696, -55.9058) (-28.0548, -77.6065) (-39.5479, -77.6065) knots 0 0 0 0 1 1 1 1
  spline S10 degree 3 poles (-39.5479, -77.6065) (-51.041, -77.6065) (-61.1261, -55.9058) (-61.1261, -42.7885) knots 0 0 0 0 1 1 1 1
  spline S11 degree 3 poles (-61.1261, -42.7885) (-61.1262, -30.4232) (-51.648, -20.7371) (-39.5479, -20.7371) knots 0 0 0 0 1 1 1 1
sketch "Skizze9" plane through (0, 0, 30) normal (0, 0, 1) x (-1, 0, 0)
  line L0 (-83.25, -22) -> (-78, -22)
  line L1 (-78, -22) -> (-78, -1.75)
  line L2 (-78, -1.75) -> (-7, -1.75)
  line L3 (-7, -1.75) -> (-7, -7)
  line L4 (-7, -7) -> (-1.75, -7)
  line L5 (-1.75, -7) -> (-1.75, -93)
  line L6 (-1.75, -93) -> (-7, -93)
  line L7 (-7, -93) -> (-7, -113.25)
  line L8 (-7, -113.25) -> (-78, -113.25)
  line L9 (-78, -113.25) -> (-78, -108)
  line L10 (-78, -108) -> (-83.25, -108)
  line L11 (-83.25, -108) -> (-83.25, -22)
  circle A0 centre (-81.5, -3.5) radius 2.65
  circle A1 centre (-81.5, -111.5) radius 2.65
  circle A2 centre (-3.5, -3.5) radius 2.65
  circle A3 centre (-3.5, -111.5) radius 2.65
  line L12 (0, -115) -> (0, 0)
  line L13 (0, 0) -> (-85, 0)
  line L14 (-85, 0) -> (-85, -115)
  line L15 (-85, -115) -> (0, -115)
  line L16 (-7, -93) -> (-1.75, -93)
  line L17 (-1.75, -93) -> (-1.75, -108)
  line L18 (-1.75, -108) -> (-7, -108)
  line L19 (-7, -108) -> (-7, -93)
  line L20 (-78, -22) -> (-83.25, -22)
  line L21 (-83.25, -22) -> (-83.25, -7)
  line L22 (-83.25, -7) -> (-78, -7)
  line L23 (-78, -7) -> (-78, -22)
  dimension "d55" = 1.75
  dimension "d56" = 7
  dimension "d57" = 1.75
  dimension "d58" = 7
extrude "Extrusion7" [suppressed]
sketch "Skizze10" plane through (0, 0, 1.75) normal (0, 0, 1) x (-1, 0, 0)
  line L0 (-7, -7) -> (-7, -1.75)
  line L1 (-7, -1.75) -> (-78, -1.75)
  line L2 (-78, -1.75) -> (-78, -7)
  line L3 (-78, -7) -> (-83.25, -7)
  line L4 (-83.25, -7) -> (-83.25, -108)
  line L5 (-83.25, -108) -> (-78, -108)
  line L6 (-78, -108) -> (-78, -113.25)
  line L7 (-78, -113.25) -> (-7, -113.25)
  line L8 (-7, -113.25) -> (-7, -108)
  line L9 (-7, -108) -> (-1.75, -108)
  line L10 (-1.75, -108) -> (-1.75, -7)
  line L11 (-1.75, -7) -> (-7, -7)
  spline S0 degree 3 poles (-64.8028, -78.627) (-58.4872, -89.9936) (-50.5977, -96.2538) (-42.5872, -96.2538) knots 0 0 0 0 1 1 1 1
  spline S1 degree 3 poles (-42.5872, -96.2538) (-34.5767, -96.2538) (-26.6876, -89.9936) (-20.3717, -78.627) knots 0 0 0 0 1 1 1 1
  spline S2 degree 3 poles (-20.3717, -78.627) (-15.1525, -69.2328) (-11.78, -57.5294) (-11.78, -48.8107) knots 0 0 0 0 1 1 1 1
  spline S3 degree 3 poles (-11.78, -48.8107) (-11.78, -40.3957) (-14.9343, -32.5167) (-20.6623, -26.6256) knots 0 0 0 0 1 1 1 1
  spline S4 degree 3 poles (-20.6623, -26.6256) (-26.4404, -20.6822) (-34.2268, -17.4094) (-42.5875, -17.4094) knots 0 0 0 0 1 1 1 1
  spline S5 degree 3 poles (-42.5875, -17.4094) (-50.9483, -17.4094) (-58.7346, -20.6825) (-64.5128, -26.6256) knots 0 0 0 0 1 1 1 1
  spline S6 degree 3 poles (-64.5128, -26.6256) (-70.2404, -32.517) (-73.3947, -40.3957) (-73.3947, -48.8107) knots 0 0 0 0 1 1 1 1
  spline S7 degree 3 poles (-73.3947, -48.8107) (-73.3944, -57.5294) (-70.0219, -69.2331) (-64.8028, -78.627) knots 0 0 0 0 1 1 1 1
  spline S8 degree 3 poles (-42.5872, -21.103) (-27.3832, -21.103) (-15.4739, -33.2736) (-15.4739, -48.8107) knots 0 0 0 0 1 1 1 1
  spline S9 degree 3 poles (-15.4739, -48.8107) (-15.4739, -65.2927) (-28.146, -92.5599) (-42.5872, -92.5599) knots 0 0 0 0 1 1 1 1
  spline S10 degree 3 poles (-42.5872, -92.5599) (-57.0284, -92.5599) (-69.7005, -65.2927) (-69.7005, -48.8107) knots 0 0 0 0 1 1 1 1
  spline S11 degree 3 poles (-69.7005, -48.8107) (-69.7005, -33.2736) (-57.7912, -21.103) (-42.5872, -21.103) knots 0 0 0 0 1 1 1 1
extrude "Extrusion8" [suppressed]
extrude "Extrusion6" [suppressed]
sketch "Skizze8" plane through (0, 0, 30) normal (0, 0, 1) x (-1, 0, 0)
  line L0 (-78, -7) -> (-78, -1.75)
  line L1 (-78, -1.75) -> (-7, -1.75)
  line L2 (-7, -1.75) -> (-7, -7)
  line L3 (-7, -7) -> (-1.75, -7)
  line L4 (-1.75, -7) -> (-1.75, -108)
  line L5 (-7, -113.25) -> (-78, -113.25)
  line L6 (-78, -113.25) -> (-78, -108)
  line L7 (-78, -108) -> (-83.25, -108)
  line L8 (-83.25, -108) -> (-83.25, -7)
  circle A0 centre (-81.5, -3.5) radius 2.65
  circle A1 centre (-81.5, -111.5) radius 2.65
  circle A2 centre (-3.5, -3.5) radius 2.65
  circle A3 centre (-3.5, -111.5) radius 2.65
  line L9 (0, -115) -> (0, 0)
  line L10 (0, 0) -> (-85, 0)
  line L11 (-85, 0) -> (-85, -115)
  line L12 (-85, -115) -> (0, -115)
  line L13 (-7, -93) -> (-2, -93)
  line L14 (-2, -93) -> (-2, -108)
  line L15 (-2, -108) -> (-7, -108)
  line L16 (-7, -108) -> (-7, -93)
  line L17 (-83.25, -7) -> (-78, -7)
  line L18 (-1.75, -108) -> (-7, -108)
  line L19 (-7, -108) -> (-7, -113.25)
  dimension "d53" = 5
  dimension "d54" = 15
equation "d31 = -30 mm + 1.75 mm"
equation "d34 = 100 mm - 14 mm"
equation "d42 = -30 mm + 1.75 mm"
equation "d49 = -30 mm + 1.75 mm"
equation "d59 = -30 mm + 1.75 mm"
equation "d94 = -30 mm + 1.75 mm"
equation "d136 = -35 mm + 1.75 mm"
equation "d184 = -35 mm + 1.75 mm"
